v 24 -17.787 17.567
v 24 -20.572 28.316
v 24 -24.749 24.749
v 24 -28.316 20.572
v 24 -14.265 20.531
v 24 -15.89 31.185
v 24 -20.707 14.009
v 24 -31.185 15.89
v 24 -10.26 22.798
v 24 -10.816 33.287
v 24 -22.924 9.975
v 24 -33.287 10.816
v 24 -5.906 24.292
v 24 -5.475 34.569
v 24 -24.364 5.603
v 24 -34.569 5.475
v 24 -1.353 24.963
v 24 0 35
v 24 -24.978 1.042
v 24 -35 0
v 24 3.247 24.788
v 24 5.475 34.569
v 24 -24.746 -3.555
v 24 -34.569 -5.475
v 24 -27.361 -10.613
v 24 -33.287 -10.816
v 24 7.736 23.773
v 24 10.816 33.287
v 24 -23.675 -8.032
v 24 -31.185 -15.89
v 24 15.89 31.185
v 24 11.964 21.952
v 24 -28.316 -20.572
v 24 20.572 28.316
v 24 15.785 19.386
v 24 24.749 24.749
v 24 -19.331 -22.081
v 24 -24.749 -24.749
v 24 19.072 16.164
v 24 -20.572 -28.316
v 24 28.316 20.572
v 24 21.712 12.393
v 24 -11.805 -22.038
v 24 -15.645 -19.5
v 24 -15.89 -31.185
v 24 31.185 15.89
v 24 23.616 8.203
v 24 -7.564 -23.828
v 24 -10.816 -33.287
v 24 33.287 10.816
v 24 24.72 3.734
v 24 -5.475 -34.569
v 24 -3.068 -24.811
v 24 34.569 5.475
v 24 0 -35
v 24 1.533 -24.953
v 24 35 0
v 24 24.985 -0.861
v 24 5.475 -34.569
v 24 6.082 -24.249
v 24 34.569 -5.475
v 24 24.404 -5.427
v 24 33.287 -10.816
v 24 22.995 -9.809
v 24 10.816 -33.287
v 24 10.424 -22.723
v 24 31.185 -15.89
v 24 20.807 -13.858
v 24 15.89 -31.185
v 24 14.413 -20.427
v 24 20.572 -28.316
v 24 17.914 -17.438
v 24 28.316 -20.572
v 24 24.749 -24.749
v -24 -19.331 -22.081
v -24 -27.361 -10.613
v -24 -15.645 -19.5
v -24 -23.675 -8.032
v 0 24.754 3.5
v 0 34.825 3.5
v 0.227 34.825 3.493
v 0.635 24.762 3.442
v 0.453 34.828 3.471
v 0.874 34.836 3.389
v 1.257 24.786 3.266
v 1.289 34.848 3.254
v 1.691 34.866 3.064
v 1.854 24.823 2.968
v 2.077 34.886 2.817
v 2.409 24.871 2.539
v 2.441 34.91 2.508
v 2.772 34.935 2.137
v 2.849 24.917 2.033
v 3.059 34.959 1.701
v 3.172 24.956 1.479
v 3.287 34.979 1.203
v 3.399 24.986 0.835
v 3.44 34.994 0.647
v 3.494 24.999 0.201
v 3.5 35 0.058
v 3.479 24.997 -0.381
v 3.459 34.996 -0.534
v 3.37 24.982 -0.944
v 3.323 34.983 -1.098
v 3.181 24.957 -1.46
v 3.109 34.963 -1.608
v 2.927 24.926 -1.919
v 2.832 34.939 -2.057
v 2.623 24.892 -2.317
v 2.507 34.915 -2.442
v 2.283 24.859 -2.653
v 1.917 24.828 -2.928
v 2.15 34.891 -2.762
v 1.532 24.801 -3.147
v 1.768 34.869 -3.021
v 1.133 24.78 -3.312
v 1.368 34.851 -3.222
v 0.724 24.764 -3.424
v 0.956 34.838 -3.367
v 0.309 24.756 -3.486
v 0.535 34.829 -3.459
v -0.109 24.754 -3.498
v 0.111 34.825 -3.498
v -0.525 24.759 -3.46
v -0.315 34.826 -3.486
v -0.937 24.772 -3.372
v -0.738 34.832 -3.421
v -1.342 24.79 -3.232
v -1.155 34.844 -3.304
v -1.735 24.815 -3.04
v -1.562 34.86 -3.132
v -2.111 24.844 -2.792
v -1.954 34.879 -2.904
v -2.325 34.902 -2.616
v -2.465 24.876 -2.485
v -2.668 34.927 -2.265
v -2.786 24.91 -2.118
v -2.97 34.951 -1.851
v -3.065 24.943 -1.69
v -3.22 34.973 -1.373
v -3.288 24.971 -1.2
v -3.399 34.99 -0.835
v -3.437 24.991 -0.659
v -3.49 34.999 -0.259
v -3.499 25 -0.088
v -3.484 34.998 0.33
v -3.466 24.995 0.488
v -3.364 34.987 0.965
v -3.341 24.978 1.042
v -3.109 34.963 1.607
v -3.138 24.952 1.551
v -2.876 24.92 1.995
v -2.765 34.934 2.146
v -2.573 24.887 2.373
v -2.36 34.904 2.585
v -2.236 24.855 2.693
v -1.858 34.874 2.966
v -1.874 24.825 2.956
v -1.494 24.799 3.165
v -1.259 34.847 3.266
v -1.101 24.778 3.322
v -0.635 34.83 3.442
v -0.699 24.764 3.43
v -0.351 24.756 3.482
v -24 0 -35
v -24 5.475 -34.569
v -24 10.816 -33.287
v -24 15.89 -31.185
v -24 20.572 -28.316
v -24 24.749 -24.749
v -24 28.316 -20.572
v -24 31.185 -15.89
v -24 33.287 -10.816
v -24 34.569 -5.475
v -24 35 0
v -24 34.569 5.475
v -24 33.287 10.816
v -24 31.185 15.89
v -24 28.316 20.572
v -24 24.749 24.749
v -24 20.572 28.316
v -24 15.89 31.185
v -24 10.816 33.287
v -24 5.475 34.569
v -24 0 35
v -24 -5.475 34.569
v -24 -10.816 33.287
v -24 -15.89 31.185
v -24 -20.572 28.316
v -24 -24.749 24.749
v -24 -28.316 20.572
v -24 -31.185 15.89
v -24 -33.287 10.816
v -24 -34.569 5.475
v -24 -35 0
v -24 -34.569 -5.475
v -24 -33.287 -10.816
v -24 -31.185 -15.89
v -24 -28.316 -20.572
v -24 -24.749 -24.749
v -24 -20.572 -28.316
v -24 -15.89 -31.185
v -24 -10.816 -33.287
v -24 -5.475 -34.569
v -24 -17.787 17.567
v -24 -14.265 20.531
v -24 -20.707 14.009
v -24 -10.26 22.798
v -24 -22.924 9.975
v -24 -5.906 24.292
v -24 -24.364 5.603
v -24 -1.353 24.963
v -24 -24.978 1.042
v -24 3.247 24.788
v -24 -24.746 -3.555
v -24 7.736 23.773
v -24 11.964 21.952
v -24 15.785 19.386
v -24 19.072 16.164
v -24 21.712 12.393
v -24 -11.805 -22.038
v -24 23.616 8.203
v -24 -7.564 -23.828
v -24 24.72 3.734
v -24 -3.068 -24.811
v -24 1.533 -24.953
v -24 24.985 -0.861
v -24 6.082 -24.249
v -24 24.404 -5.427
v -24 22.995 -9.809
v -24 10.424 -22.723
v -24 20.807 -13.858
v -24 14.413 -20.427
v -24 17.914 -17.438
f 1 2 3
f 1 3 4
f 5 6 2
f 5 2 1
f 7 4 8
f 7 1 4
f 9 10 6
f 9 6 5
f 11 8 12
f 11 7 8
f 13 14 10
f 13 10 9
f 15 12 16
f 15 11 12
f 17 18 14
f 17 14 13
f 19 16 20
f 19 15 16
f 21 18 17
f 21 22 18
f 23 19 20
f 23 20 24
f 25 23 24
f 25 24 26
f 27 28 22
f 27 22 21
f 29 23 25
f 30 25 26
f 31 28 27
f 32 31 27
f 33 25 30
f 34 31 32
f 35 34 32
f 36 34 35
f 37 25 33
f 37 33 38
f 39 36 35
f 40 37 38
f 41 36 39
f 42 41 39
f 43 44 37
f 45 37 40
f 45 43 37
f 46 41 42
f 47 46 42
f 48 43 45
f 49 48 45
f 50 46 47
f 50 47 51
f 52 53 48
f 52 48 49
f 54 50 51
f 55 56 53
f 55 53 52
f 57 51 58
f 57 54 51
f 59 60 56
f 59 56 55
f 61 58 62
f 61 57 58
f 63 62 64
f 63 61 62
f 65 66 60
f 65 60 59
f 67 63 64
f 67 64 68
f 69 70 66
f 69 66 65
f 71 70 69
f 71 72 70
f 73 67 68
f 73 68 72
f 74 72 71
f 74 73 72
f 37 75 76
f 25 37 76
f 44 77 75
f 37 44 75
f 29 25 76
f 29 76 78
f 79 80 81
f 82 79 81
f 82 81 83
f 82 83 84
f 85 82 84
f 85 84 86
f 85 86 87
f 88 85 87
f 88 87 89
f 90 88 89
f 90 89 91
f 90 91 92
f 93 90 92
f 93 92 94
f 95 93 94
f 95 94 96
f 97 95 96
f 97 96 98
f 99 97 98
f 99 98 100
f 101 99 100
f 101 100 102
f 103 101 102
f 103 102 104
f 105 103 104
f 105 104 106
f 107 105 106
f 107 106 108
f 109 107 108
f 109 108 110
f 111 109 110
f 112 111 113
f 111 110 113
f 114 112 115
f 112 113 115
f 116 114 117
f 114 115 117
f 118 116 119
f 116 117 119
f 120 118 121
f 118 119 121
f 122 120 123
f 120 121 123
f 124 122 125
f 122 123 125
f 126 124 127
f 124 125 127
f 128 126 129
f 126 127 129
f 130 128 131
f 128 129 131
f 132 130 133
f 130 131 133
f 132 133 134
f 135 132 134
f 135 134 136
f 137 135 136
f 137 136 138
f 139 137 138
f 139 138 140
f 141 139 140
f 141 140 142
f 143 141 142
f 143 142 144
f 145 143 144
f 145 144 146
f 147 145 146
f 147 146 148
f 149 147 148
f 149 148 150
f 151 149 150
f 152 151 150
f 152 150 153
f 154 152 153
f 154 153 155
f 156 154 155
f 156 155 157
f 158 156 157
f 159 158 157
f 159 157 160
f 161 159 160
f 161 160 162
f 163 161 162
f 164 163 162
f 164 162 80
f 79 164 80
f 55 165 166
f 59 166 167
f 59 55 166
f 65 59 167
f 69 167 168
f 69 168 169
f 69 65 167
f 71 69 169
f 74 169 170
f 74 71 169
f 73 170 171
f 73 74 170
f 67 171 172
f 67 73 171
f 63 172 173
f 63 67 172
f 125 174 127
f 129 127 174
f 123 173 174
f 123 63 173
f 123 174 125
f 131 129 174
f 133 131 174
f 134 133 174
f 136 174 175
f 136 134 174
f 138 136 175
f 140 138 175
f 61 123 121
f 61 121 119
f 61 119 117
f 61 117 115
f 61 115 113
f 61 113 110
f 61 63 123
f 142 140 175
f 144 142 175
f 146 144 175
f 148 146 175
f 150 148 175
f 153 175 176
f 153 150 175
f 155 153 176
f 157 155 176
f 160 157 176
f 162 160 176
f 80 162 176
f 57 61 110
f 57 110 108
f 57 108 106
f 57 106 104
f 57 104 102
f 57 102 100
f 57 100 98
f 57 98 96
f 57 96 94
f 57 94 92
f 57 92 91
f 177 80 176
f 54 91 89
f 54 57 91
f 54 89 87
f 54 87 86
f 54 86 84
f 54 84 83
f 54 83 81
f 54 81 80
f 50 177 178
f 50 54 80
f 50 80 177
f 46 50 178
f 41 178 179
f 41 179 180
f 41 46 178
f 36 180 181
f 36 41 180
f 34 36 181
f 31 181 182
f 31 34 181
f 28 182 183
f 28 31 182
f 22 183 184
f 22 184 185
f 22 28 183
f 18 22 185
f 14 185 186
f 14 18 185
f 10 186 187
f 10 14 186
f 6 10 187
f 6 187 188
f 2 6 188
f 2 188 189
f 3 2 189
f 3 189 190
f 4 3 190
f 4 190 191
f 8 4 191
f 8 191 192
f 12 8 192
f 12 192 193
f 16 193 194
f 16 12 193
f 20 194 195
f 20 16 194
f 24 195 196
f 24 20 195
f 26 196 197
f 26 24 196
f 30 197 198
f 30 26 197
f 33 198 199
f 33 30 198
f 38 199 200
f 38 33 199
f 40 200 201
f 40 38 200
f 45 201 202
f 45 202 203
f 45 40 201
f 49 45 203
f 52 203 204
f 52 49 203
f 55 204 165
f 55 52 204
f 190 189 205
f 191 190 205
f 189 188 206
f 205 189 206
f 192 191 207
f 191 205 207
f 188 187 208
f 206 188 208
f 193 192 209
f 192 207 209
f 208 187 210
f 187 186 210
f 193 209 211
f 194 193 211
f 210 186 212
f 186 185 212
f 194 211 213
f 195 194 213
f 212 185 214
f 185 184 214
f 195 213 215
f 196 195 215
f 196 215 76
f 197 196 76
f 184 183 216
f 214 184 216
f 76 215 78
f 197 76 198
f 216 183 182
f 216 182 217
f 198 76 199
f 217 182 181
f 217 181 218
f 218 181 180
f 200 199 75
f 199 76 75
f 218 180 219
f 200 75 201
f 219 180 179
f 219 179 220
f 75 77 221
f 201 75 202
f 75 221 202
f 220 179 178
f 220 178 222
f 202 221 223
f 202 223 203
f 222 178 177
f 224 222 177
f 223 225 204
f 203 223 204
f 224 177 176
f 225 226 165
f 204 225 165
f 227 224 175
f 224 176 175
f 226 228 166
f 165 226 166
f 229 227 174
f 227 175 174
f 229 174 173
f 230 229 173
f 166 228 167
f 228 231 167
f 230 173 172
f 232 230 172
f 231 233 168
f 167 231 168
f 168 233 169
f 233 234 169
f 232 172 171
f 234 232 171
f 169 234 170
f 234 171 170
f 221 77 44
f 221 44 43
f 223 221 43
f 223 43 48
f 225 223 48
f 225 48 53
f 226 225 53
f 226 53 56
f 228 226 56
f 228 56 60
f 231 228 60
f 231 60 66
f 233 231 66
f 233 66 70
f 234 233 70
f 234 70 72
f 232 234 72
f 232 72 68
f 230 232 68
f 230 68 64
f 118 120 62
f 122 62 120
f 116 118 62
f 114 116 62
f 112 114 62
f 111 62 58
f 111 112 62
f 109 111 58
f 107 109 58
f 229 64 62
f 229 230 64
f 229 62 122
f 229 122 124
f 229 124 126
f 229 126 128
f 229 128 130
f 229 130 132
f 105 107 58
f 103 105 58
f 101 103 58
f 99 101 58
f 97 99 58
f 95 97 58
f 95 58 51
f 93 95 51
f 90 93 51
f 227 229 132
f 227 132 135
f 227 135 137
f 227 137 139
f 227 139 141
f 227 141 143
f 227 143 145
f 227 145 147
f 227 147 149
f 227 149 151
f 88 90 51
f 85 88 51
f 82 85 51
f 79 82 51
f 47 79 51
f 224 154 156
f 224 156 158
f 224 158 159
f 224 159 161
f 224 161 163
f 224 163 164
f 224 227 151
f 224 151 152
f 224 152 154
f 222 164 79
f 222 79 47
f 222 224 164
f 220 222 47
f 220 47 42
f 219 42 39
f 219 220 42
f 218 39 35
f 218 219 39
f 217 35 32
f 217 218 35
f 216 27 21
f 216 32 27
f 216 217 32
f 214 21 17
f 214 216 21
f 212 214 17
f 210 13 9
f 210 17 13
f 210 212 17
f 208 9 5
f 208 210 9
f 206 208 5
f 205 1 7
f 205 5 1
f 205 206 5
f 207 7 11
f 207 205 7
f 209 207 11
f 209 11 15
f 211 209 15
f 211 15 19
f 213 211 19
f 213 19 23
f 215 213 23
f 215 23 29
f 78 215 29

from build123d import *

# Parameters (mm, degrees)
SKETCH1_R           = 35
SKETCH1_R_2         = 25
BOSS_EXTRUDE1_DEPTH = 24
CUT_EXTRUDE2_DEPTH  = 69.949256704
SKETCH6_R           = 3.5
CUT_EXTRUDE3_DEPTH  = 24


with BuildPart() as part:
    # Sketch1 → Boss-Extrude1 (new, symmetric)
    with BuildSketch(Plane(origin=(0, 0, 0), x_dir=(0, 0, -1), z_dir=(1, 0, 0))):
        Circle(SKETCH1_R)
        Circle(SKETCH1_R_2, mode=Mode.SUBTRACT)
    extrude(amount=BOSS_EXTRUDE1_DEPTH, both=True)

    # Sketch5 → Cut-Extrude2 (cut, through all)
    with BuildSketch(Plane(origin=(24, 0, 0), x_dir=(0, 0, -1), z_dir=(1, 0, 0))):
        Polygon((22.080992746, -19.330798208), (10.612864126, -27.360868317), (2.618348192, -15.943516321), (14.086476812, -7.913446212), align=None)
    extrude(amount=-CUT_EXTRUDE2_DEPTH, mode=Mode.SUBTRACT)

    # Sketch6 → Cut-Extrude3 (cut)
    with BuildSketch(Plane(origin=(0, 35, 0), x_dir=(-1, 0, 0), z_dir=(0, 1, 0))):
        with Locations(Location((0, 0, 0), (0, 0, 90))):
            Circle(SKETCH6_R)
    extrude(amount=-CUT_EXTRUDE3_DEPTH, mode=Mode.SUBTRACT)


solid = part.part
